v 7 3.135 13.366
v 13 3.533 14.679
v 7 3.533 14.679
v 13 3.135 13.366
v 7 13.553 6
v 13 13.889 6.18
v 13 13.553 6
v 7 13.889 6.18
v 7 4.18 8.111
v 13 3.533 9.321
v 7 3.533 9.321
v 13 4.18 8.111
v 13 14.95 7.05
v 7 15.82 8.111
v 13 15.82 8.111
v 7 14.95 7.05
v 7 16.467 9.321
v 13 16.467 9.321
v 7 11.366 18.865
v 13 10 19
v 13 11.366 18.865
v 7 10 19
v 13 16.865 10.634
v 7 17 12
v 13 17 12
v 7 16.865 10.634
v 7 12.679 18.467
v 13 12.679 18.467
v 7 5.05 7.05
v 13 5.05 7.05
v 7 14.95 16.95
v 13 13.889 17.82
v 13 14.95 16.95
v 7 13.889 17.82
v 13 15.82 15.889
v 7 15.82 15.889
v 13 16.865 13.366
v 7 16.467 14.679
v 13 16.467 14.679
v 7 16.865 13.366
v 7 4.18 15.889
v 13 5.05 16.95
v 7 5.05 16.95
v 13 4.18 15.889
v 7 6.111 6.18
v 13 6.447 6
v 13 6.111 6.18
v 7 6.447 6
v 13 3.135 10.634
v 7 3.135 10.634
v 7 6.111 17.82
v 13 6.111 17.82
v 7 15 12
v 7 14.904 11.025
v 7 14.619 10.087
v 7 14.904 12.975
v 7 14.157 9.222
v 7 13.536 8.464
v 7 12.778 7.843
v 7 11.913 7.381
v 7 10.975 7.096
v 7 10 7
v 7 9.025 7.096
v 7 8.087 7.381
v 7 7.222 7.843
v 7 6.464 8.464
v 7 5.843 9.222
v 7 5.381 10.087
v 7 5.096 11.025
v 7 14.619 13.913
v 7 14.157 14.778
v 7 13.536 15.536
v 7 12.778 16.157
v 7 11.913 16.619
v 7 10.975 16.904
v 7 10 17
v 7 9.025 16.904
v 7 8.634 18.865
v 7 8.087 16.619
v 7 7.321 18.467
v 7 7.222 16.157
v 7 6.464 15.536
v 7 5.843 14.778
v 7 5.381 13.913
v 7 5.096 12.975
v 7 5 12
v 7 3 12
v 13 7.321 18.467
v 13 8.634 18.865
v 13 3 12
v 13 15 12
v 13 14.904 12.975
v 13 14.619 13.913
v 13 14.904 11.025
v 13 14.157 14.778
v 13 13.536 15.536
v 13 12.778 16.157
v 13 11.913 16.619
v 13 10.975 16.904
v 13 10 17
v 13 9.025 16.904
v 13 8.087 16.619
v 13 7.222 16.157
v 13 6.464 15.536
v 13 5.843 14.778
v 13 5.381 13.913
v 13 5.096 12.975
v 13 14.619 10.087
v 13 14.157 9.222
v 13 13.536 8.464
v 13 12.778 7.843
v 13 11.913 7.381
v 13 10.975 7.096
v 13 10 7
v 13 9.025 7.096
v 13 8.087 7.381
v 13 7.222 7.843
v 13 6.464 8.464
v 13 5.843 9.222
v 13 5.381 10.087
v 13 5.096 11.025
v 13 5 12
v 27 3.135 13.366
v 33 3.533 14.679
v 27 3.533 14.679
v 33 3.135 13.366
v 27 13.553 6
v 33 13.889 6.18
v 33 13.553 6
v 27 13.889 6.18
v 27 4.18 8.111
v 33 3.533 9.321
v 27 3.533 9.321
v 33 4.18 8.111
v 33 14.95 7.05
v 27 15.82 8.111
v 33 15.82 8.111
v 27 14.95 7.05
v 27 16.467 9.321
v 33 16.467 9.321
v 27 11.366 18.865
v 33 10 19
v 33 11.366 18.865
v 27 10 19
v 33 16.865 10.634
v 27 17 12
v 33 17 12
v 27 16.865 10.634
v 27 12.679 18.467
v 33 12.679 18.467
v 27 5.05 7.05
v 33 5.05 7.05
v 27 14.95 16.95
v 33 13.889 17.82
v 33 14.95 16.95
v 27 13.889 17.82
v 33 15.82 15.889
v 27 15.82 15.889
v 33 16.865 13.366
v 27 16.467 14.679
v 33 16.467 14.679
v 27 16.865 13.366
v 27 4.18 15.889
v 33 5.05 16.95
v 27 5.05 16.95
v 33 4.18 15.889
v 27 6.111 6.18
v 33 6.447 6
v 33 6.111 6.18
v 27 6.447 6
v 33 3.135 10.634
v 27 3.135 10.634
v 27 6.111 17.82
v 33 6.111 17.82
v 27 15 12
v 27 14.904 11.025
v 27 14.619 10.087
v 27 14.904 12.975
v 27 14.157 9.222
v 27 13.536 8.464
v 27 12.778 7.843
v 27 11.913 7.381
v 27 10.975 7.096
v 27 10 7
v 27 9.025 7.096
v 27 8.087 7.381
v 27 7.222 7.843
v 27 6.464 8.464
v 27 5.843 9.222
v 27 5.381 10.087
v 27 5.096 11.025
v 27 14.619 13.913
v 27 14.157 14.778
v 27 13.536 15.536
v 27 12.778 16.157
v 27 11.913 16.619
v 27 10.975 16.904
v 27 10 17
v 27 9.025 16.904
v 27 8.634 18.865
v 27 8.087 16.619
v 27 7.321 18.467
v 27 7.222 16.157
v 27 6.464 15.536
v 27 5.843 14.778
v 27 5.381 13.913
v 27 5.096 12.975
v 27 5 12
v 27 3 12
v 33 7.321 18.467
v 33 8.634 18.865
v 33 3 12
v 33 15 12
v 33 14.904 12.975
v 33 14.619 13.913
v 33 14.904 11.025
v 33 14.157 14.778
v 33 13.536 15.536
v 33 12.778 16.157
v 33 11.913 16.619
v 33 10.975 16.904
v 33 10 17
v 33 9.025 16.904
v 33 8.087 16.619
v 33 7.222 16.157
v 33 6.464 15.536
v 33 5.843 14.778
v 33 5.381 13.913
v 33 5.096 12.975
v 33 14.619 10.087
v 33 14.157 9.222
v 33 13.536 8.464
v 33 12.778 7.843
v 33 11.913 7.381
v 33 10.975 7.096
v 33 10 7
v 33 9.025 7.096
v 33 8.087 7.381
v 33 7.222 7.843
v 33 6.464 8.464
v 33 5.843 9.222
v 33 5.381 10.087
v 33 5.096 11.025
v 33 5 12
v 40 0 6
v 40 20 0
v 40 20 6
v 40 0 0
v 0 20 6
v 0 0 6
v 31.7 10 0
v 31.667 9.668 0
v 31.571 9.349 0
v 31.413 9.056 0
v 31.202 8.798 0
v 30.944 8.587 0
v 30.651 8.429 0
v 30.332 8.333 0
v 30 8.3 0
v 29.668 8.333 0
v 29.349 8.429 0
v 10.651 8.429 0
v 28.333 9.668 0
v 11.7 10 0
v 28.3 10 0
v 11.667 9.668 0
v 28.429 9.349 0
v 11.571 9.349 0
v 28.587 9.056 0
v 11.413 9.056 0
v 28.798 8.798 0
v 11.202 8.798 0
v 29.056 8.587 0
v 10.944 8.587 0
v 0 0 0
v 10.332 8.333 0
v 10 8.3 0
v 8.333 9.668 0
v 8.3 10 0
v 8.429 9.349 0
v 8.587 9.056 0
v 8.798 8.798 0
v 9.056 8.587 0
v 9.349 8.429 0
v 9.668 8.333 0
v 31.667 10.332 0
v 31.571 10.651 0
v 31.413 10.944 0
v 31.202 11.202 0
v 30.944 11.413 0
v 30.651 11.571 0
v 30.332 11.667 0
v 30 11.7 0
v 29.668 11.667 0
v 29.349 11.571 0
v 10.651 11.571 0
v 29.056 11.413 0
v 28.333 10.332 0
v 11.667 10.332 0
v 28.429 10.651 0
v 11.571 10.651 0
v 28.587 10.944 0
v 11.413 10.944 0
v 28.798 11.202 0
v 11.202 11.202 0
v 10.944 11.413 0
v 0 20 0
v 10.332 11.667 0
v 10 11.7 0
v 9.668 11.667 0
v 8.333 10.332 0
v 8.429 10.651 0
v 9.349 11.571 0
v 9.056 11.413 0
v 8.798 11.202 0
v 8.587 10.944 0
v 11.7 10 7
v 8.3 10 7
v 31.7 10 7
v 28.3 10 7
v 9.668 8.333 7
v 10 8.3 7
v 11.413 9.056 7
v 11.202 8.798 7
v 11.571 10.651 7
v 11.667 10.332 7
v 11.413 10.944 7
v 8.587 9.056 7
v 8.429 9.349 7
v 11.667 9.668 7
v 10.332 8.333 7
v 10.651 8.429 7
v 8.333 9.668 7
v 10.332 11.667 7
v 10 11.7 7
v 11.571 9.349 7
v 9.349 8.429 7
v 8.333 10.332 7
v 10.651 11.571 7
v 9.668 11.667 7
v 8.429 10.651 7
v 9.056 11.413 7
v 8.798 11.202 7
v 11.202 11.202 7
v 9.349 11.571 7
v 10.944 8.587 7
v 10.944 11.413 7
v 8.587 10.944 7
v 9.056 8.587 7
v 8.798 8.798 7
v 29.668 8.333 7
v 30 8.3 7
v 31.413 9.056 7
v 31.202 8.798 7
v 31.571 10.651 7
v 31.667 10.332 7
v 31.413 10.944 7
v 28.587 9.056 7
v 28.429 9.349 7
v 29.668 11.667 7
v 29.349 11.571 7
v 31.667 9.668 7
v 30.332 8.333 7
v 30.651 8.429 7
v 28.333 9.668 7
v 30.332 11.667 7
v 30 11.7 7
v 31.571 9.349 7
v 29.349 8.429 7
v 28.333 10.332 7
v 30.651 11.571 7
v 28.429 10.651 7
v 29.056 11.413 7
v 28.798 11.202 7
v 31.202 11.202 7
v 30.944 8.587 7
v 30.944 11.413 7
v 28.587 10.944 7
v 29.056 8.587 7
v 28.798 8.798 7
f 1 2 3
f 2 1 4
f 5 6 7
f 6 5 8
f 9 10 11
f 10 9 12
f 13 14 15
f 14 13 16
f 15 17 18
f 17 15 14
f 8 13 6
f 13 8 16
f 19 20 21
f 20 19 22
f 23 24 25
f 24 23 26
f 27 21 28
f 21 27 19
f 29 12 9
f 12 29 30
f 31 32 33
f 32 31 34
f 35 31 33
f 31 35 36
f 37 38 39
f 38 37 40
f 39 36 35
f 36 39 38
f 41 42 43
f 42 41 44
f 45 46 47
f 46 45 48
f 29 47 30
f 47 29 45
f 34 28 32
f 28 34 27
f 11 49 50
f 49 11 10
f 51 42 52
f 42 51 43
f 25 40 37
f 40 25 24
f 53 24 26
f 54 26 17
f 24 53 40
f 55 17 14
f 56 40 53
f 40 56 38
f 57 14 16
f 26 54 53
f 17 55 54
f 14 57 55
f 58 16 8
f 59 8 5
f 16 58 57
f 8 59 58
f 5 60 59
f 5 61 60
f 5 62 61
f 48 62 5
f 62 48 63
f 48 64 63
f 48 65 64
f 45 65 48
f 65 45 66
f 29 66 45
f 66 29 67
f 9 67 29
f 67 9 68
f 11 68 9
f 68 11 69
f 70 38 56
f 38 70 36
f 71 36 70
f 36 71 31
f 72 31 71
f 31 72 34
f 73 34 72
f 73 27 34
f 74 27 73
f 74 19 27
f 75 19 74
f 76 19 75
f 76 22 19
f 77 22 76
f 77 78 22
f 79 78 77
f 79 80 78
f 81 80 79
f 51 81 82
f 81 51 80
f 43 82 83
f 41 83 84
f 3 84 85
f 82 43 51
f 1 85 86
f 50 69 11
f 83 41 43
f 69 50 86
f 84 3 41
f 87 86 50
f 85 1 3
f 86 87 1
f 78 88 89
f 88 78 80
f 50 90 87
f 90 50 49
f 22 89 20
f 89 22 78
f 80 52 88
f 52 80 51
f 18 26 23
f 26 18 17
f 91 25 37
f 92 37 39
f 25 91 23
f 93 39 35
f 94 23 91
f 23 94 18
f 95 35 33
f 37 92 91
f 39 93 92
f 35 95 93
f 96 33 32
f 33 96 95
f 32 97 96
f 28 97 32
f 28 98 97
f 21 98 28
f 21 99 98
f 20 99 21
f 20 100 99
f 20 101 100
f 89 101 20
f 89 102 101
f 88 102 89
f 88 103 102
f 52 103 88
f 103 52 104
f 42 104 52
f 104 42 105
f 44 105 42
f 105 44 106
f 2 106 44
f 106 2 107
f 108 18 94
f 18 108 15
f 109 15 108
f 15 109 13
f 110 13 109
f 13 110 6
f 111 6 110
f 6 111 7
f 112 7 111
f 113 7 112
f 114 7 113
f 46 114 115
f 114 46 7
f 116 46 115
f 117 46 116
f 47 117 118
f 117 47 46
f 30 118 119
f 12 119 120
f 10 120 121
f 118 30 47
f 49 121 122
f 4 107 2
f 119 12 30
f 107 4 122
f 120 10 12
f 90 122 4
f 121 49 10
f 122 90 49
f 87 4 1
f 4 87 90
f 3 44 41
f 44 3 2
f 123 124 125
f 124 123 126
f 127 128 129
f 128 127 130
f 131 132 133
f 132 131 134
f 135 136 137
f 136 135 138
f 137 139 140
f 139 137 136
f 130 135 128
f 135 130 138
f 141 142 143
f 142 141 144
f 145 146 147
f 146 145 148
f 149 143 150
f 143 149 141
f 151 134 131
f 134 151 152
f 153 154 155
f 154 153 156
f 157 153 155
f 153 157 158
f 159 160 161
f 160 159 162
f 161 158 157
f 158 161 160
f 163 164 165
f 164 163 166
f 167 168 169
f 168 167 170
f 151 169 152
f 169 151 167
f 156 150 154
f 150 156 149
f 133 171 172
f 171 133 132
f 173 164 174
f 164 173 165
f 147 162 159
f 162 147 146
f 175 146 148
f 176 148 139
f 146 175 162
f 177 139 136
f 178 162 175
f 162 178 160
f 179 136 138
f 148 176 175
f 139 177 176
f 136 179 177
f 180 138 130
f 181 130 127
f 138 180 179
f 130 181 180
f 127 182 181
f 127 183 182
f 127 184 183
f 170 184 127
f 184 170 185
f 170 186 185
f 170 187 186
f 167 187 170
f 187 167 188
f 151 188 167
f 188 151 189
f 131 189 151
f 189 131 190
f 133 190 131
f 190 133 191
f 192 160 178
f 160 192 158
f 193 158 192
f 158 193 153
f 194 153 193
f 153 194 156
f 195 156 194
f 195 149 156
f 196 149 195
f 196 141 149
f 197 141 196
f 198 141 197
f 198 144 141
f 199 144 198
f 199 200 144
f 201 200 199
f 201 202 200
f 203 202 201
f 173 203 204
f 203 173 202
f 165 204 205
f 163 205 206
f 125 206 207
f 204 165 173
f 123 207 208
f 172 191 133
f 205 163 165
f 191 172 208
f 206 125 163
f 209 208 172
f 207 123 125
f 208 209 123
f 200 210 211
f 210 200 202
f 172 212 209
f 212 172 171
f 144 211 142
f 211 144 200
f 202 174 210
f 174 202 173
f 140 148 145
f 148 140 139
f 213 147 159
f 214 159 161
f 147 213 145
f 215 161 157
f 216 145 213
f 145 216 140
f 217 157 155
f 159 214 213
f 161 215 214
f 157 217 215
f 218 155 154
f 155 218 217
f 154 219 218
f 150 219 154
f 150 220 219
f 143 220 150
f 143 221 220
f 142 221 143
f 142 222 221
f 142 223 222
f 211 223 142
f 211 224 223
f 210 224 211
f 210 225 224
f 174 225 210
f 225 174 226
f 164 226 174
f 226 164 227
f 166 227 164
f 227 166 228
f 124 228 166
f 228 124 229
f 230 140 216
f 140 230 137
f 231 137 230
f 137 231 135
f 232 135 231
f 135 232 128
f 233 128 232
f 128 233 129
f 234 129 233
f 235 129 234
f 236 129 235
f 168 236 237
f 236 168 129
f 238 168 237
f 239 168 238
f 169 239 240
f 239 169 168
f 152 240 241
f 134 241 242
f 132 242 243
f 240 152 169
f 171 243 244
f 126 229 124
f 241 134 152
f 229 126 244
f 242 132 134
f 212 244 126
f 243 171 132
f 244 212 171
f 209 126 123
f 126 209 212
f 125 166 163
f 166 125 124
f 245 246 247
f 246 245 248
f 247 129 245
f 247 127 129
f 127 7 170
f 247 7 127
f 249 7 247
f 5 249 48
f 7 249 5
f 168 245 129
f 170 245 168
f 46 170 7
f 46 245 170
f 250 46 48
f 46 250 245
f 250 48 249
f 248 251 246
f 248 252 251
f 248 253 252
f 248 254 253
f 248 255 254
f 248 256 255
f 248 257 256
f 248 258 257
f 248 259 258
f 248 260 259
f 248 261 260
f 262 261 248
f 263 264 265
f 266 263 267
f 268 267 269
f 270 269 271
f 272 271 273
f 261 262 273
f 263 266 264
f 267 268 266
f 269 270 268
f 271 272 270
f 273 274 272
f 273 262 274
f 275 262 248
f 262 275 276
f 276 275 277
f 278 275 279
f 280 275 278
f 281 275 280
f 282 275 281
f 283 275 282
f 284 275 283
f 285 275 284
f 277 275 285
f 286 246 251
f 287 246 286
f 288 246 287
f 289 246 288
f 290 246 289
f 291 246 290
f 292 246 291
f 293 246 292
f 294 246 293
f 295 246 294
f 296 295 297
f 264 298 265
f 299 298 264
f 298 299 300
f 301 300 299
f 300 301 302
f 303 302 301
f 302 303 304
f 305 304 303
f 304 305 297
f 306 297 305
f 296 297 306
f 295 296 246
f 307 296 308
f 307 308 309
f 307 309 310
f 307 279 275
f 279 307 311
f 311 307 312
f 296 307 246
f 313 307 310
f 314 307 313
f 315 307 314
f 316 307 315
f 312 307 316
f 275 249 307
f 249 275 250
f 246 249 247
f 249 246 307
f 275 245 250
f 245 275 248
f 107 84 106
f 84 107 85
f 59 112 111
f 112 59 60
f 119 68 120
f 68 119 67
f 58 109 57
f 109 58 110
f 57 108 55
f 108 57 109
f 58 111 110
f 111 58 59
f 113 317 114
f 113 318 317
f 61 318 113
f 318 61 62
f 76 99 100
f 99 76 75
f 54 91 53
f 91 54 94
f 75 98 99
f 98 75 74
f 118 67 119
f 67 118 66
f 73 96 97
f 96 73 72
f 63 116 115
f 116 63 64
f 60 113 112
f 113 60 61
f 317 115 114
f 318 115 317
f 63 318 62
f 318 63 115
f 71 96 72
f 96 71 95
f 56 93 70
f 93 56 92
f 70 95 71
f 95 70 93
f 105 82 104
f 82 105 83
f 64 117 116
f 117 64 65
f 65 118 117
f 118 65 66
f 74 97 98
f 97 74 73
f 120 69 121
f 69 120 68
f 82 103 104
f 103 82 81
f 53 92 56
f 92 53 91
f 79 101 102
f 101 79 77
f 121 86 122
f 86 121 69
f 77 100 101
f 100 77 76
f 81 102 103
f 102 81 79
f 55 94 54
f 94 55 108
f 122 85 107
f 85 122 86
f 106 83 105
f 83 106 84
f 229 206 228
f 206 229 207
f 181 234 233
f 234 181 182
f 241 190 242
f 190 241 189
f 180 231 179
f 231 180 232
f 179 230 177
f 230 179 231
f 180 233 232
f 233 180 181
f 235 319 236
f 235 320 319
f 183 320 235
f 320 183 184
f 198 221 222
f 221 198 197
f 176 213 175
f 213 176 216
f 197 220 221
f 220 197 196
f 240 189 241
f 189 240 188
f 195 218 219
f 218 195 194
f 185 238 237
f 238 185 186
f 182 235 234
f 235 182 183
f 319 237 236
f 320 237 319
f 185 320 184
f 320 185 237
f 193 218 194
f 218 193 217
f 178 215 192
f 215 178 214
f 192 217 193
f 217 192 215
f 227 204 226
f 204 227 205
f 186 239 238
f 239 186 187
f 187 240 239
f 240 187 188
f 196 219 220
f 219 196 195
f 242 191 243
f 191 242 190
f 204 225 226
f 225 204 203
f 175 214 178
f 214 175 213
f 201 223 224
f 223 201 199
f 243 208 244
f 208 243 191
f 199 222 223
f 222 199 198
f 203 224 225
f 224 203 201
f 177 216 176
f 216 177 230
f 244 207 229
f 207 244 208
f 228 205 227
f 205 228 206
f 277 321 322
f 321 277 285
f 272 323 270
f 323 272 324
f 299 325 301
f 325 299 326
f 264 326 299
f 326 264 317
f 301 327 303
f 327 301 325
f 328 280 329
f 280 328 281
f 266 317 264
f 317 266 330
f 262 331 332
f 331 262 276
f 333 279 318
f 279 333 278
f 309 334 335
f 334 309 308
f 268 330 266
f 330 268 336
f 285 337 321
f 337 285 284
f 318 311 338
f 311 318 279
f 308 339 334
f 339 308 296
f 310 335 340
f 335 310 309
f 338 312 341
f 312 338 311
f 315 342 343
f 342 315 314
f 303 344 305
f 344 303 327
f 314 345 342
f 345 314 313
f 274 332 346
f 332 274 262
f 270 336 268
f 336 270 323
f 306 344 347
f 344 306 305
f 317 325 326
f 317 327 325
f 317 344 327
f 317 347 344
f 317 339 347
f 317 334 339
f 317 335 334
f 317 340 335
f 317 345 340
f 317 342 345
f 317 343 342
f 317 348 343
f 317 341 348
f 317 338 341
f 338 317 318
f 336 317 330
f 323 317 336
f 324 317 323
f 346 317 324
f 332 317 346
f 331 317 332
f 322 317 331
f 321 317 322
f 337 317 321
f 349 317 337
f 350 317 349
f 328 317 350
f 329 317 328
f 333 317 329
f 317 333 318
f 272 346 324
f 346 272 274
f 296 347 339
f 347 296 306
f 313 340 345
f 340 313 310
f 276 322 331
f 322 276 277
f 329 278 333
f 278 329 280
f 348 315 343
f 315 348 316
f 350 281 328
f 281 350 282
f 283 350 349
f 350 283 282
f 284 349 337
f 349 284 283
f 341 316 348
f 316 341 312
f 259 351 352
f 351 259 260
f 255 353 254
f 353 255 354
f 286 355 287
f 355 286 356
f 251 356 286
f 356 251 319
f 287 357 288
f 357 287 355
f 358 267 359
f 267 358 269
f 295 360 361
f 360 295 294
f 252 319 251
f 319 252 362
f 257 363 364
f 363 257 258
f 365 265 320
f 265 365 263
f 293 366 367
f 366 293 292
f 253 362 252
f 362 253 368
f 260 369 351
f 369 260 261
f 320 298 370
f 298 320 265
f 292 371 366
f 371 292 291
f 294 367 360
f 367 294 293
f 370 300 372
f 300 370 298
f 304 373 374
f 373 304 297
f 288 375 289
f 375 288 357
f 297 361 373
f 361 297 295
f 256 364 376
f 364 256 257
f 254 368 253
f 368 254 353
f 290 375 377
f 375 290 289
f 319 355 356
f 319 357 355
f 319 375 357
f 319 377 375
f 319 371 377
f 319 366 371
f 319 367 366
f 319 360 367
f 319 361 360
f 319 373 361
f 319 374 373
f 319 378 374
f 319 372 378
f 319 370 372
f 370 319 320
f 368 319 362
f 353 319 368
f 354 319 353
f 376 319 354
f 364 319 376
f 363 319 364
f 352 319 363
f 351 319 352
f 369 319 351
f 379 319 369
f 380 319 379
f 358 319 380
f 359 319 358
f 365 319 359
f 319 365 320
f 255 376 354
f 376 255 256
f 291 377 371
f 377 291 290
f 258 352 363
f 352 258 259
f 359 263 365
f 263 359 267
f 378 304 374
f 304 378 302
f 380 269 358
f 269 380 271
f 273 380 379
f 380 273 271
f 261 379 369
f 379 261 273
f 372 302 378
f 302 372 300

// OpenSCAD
$fn = 32;

// ----------------------------------------------------------------------
// Cable clip: cable 10 mm, clamp 14 mm, base 40 mm
// ----------------------------------------------------------------------

// --- parameters (mm) ---
base_w = 40;              // base length, X
base_d = 20;              // base width, Y
base_t = 6;               // base thickness
clamp_d = 14;             // clamp outside diameter
wall_t = 2;               // clamp wall
cable_d = 10;             // cable opening
ring_w = 6;               // clamp width along the cable
screw_d = 3.4;            // screw clearance
sink = 1;                 // overlap of the clamp into the base
pitch = 20;               // distance between the two clamps

module base() {
  cube([base_w, base_d, base_t]);
}

module clamps() {
  for (sx = [-1, 1])
    translate([base_w / 2 + sx * pitch / 2, base_d / 2, base_t + clamp_d / 2 - sink]) rotate([0, 90, 0])
      cylinder(h = ring_w, d = clamp_d, center = true);
}

difference() {
  union() {
    base();
    clamps();
  }
  for (sx = [-1, 1])
    translate([base_w / 2 + sx * pitch / 2, base_d / 2, base_t + clamp_d / 2 - sink]) rotate([0, 90, 0]) translate([0, 0, -ring_w / 2 - 1]) cylinder(h = ring_w + 2, d = cable_d);
  translate([10, base_d / 2, -1]) cylinder(h = base_t + 2, d = screw_d);
  translate([30, base_d / 2, -1]) cylinder(h = base_t + 2, d = screw_d);
}
